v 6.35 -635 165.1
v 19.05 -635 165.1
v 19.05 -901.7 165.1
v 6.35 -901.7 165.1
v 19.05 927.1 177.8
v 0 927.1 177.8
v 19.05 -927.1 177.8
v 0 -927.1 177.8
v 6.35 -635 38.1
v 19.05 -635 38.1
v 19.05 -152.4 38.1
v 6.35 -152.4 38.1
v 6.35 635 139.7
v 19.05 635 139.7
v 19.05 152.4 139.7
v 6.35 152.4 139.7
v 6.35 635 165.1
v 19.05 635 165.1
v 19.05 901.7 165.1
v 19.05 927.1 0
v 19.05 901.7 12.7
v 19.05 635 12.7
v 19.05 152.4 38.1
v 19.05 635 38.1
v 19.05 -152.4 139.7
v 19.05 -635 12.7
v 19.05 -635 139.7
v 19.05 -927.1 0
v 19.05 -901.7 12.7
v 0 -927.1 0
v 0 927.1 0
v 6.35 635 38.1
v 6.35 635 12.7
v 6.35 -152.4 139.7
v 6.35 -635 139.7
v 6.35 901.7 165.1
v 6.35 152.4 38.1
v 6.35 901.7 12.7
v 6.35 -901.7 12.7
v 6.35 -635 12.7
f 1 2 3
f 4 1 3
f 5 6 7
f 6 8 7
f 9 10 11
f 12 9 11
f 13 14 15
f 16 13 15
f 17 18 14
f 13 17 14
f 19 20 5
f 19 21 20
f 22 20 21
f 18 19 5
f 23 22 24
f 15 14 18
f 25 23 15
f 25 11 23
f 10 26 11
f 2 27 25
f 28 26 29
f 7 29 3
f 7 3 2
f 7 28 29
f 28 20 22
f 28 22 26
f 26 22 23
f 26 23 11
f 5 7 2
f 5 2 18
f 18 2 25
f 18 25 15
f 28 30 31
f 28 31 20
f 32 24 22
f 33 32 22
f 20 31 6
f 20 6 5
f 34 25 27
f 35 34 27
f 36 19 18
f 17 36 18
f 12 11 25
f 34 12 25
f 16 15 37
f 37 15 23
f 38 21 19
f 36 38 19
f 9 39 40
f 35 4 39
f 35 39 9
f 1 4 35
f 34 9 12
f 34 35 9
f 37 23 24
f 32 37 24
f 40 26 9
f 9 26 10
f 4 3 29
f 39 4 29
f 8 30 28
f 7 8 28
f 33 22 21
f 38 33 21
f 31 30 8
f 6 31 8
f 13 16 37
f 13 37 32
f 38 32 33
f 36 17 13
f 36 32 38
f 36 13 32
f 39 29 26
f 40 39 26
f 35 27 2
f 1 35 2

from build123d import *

# Parameters (mm, degrees)
F0_W     = 19.05
F0_H     = 177.8
F1_DEPTH = 927.1
F3_DEPTH = 12.7


with BuildPart() as f1:
    # F0 (on Front) → F1 (new body, symmetric)
    with BuildSketch(Plane.XZ):
        with Locations((9.525, 88.9)):
            Rectangle(F0_W, F0_H)
    extrude(amount=F1_DEPTH, both=True)

    # F2 (on face) → F3 (cut)
    with BuildSketch(Plane.YZ.offset(19.05)):
        Polygon((-901.7, 165.1), (-901.7, 12.7), (-635, 12.7), (-635, 38.1), (-152.4, 38.1), (-152.4, 139.7), (-635, 139.7), (-635, 165.1), align=None)
        Polygon((901.7, 12.7), (901.7, 165.1), (635, 165.1), (635, 139.7), (152.4, 139.7), (152.4, 38.1), (635, 38.1), (635, 12.7), align=None)
    extrude(amount=-F3_DEPTH, mode=Mode.SUBTRACT)


solid = f1.part
